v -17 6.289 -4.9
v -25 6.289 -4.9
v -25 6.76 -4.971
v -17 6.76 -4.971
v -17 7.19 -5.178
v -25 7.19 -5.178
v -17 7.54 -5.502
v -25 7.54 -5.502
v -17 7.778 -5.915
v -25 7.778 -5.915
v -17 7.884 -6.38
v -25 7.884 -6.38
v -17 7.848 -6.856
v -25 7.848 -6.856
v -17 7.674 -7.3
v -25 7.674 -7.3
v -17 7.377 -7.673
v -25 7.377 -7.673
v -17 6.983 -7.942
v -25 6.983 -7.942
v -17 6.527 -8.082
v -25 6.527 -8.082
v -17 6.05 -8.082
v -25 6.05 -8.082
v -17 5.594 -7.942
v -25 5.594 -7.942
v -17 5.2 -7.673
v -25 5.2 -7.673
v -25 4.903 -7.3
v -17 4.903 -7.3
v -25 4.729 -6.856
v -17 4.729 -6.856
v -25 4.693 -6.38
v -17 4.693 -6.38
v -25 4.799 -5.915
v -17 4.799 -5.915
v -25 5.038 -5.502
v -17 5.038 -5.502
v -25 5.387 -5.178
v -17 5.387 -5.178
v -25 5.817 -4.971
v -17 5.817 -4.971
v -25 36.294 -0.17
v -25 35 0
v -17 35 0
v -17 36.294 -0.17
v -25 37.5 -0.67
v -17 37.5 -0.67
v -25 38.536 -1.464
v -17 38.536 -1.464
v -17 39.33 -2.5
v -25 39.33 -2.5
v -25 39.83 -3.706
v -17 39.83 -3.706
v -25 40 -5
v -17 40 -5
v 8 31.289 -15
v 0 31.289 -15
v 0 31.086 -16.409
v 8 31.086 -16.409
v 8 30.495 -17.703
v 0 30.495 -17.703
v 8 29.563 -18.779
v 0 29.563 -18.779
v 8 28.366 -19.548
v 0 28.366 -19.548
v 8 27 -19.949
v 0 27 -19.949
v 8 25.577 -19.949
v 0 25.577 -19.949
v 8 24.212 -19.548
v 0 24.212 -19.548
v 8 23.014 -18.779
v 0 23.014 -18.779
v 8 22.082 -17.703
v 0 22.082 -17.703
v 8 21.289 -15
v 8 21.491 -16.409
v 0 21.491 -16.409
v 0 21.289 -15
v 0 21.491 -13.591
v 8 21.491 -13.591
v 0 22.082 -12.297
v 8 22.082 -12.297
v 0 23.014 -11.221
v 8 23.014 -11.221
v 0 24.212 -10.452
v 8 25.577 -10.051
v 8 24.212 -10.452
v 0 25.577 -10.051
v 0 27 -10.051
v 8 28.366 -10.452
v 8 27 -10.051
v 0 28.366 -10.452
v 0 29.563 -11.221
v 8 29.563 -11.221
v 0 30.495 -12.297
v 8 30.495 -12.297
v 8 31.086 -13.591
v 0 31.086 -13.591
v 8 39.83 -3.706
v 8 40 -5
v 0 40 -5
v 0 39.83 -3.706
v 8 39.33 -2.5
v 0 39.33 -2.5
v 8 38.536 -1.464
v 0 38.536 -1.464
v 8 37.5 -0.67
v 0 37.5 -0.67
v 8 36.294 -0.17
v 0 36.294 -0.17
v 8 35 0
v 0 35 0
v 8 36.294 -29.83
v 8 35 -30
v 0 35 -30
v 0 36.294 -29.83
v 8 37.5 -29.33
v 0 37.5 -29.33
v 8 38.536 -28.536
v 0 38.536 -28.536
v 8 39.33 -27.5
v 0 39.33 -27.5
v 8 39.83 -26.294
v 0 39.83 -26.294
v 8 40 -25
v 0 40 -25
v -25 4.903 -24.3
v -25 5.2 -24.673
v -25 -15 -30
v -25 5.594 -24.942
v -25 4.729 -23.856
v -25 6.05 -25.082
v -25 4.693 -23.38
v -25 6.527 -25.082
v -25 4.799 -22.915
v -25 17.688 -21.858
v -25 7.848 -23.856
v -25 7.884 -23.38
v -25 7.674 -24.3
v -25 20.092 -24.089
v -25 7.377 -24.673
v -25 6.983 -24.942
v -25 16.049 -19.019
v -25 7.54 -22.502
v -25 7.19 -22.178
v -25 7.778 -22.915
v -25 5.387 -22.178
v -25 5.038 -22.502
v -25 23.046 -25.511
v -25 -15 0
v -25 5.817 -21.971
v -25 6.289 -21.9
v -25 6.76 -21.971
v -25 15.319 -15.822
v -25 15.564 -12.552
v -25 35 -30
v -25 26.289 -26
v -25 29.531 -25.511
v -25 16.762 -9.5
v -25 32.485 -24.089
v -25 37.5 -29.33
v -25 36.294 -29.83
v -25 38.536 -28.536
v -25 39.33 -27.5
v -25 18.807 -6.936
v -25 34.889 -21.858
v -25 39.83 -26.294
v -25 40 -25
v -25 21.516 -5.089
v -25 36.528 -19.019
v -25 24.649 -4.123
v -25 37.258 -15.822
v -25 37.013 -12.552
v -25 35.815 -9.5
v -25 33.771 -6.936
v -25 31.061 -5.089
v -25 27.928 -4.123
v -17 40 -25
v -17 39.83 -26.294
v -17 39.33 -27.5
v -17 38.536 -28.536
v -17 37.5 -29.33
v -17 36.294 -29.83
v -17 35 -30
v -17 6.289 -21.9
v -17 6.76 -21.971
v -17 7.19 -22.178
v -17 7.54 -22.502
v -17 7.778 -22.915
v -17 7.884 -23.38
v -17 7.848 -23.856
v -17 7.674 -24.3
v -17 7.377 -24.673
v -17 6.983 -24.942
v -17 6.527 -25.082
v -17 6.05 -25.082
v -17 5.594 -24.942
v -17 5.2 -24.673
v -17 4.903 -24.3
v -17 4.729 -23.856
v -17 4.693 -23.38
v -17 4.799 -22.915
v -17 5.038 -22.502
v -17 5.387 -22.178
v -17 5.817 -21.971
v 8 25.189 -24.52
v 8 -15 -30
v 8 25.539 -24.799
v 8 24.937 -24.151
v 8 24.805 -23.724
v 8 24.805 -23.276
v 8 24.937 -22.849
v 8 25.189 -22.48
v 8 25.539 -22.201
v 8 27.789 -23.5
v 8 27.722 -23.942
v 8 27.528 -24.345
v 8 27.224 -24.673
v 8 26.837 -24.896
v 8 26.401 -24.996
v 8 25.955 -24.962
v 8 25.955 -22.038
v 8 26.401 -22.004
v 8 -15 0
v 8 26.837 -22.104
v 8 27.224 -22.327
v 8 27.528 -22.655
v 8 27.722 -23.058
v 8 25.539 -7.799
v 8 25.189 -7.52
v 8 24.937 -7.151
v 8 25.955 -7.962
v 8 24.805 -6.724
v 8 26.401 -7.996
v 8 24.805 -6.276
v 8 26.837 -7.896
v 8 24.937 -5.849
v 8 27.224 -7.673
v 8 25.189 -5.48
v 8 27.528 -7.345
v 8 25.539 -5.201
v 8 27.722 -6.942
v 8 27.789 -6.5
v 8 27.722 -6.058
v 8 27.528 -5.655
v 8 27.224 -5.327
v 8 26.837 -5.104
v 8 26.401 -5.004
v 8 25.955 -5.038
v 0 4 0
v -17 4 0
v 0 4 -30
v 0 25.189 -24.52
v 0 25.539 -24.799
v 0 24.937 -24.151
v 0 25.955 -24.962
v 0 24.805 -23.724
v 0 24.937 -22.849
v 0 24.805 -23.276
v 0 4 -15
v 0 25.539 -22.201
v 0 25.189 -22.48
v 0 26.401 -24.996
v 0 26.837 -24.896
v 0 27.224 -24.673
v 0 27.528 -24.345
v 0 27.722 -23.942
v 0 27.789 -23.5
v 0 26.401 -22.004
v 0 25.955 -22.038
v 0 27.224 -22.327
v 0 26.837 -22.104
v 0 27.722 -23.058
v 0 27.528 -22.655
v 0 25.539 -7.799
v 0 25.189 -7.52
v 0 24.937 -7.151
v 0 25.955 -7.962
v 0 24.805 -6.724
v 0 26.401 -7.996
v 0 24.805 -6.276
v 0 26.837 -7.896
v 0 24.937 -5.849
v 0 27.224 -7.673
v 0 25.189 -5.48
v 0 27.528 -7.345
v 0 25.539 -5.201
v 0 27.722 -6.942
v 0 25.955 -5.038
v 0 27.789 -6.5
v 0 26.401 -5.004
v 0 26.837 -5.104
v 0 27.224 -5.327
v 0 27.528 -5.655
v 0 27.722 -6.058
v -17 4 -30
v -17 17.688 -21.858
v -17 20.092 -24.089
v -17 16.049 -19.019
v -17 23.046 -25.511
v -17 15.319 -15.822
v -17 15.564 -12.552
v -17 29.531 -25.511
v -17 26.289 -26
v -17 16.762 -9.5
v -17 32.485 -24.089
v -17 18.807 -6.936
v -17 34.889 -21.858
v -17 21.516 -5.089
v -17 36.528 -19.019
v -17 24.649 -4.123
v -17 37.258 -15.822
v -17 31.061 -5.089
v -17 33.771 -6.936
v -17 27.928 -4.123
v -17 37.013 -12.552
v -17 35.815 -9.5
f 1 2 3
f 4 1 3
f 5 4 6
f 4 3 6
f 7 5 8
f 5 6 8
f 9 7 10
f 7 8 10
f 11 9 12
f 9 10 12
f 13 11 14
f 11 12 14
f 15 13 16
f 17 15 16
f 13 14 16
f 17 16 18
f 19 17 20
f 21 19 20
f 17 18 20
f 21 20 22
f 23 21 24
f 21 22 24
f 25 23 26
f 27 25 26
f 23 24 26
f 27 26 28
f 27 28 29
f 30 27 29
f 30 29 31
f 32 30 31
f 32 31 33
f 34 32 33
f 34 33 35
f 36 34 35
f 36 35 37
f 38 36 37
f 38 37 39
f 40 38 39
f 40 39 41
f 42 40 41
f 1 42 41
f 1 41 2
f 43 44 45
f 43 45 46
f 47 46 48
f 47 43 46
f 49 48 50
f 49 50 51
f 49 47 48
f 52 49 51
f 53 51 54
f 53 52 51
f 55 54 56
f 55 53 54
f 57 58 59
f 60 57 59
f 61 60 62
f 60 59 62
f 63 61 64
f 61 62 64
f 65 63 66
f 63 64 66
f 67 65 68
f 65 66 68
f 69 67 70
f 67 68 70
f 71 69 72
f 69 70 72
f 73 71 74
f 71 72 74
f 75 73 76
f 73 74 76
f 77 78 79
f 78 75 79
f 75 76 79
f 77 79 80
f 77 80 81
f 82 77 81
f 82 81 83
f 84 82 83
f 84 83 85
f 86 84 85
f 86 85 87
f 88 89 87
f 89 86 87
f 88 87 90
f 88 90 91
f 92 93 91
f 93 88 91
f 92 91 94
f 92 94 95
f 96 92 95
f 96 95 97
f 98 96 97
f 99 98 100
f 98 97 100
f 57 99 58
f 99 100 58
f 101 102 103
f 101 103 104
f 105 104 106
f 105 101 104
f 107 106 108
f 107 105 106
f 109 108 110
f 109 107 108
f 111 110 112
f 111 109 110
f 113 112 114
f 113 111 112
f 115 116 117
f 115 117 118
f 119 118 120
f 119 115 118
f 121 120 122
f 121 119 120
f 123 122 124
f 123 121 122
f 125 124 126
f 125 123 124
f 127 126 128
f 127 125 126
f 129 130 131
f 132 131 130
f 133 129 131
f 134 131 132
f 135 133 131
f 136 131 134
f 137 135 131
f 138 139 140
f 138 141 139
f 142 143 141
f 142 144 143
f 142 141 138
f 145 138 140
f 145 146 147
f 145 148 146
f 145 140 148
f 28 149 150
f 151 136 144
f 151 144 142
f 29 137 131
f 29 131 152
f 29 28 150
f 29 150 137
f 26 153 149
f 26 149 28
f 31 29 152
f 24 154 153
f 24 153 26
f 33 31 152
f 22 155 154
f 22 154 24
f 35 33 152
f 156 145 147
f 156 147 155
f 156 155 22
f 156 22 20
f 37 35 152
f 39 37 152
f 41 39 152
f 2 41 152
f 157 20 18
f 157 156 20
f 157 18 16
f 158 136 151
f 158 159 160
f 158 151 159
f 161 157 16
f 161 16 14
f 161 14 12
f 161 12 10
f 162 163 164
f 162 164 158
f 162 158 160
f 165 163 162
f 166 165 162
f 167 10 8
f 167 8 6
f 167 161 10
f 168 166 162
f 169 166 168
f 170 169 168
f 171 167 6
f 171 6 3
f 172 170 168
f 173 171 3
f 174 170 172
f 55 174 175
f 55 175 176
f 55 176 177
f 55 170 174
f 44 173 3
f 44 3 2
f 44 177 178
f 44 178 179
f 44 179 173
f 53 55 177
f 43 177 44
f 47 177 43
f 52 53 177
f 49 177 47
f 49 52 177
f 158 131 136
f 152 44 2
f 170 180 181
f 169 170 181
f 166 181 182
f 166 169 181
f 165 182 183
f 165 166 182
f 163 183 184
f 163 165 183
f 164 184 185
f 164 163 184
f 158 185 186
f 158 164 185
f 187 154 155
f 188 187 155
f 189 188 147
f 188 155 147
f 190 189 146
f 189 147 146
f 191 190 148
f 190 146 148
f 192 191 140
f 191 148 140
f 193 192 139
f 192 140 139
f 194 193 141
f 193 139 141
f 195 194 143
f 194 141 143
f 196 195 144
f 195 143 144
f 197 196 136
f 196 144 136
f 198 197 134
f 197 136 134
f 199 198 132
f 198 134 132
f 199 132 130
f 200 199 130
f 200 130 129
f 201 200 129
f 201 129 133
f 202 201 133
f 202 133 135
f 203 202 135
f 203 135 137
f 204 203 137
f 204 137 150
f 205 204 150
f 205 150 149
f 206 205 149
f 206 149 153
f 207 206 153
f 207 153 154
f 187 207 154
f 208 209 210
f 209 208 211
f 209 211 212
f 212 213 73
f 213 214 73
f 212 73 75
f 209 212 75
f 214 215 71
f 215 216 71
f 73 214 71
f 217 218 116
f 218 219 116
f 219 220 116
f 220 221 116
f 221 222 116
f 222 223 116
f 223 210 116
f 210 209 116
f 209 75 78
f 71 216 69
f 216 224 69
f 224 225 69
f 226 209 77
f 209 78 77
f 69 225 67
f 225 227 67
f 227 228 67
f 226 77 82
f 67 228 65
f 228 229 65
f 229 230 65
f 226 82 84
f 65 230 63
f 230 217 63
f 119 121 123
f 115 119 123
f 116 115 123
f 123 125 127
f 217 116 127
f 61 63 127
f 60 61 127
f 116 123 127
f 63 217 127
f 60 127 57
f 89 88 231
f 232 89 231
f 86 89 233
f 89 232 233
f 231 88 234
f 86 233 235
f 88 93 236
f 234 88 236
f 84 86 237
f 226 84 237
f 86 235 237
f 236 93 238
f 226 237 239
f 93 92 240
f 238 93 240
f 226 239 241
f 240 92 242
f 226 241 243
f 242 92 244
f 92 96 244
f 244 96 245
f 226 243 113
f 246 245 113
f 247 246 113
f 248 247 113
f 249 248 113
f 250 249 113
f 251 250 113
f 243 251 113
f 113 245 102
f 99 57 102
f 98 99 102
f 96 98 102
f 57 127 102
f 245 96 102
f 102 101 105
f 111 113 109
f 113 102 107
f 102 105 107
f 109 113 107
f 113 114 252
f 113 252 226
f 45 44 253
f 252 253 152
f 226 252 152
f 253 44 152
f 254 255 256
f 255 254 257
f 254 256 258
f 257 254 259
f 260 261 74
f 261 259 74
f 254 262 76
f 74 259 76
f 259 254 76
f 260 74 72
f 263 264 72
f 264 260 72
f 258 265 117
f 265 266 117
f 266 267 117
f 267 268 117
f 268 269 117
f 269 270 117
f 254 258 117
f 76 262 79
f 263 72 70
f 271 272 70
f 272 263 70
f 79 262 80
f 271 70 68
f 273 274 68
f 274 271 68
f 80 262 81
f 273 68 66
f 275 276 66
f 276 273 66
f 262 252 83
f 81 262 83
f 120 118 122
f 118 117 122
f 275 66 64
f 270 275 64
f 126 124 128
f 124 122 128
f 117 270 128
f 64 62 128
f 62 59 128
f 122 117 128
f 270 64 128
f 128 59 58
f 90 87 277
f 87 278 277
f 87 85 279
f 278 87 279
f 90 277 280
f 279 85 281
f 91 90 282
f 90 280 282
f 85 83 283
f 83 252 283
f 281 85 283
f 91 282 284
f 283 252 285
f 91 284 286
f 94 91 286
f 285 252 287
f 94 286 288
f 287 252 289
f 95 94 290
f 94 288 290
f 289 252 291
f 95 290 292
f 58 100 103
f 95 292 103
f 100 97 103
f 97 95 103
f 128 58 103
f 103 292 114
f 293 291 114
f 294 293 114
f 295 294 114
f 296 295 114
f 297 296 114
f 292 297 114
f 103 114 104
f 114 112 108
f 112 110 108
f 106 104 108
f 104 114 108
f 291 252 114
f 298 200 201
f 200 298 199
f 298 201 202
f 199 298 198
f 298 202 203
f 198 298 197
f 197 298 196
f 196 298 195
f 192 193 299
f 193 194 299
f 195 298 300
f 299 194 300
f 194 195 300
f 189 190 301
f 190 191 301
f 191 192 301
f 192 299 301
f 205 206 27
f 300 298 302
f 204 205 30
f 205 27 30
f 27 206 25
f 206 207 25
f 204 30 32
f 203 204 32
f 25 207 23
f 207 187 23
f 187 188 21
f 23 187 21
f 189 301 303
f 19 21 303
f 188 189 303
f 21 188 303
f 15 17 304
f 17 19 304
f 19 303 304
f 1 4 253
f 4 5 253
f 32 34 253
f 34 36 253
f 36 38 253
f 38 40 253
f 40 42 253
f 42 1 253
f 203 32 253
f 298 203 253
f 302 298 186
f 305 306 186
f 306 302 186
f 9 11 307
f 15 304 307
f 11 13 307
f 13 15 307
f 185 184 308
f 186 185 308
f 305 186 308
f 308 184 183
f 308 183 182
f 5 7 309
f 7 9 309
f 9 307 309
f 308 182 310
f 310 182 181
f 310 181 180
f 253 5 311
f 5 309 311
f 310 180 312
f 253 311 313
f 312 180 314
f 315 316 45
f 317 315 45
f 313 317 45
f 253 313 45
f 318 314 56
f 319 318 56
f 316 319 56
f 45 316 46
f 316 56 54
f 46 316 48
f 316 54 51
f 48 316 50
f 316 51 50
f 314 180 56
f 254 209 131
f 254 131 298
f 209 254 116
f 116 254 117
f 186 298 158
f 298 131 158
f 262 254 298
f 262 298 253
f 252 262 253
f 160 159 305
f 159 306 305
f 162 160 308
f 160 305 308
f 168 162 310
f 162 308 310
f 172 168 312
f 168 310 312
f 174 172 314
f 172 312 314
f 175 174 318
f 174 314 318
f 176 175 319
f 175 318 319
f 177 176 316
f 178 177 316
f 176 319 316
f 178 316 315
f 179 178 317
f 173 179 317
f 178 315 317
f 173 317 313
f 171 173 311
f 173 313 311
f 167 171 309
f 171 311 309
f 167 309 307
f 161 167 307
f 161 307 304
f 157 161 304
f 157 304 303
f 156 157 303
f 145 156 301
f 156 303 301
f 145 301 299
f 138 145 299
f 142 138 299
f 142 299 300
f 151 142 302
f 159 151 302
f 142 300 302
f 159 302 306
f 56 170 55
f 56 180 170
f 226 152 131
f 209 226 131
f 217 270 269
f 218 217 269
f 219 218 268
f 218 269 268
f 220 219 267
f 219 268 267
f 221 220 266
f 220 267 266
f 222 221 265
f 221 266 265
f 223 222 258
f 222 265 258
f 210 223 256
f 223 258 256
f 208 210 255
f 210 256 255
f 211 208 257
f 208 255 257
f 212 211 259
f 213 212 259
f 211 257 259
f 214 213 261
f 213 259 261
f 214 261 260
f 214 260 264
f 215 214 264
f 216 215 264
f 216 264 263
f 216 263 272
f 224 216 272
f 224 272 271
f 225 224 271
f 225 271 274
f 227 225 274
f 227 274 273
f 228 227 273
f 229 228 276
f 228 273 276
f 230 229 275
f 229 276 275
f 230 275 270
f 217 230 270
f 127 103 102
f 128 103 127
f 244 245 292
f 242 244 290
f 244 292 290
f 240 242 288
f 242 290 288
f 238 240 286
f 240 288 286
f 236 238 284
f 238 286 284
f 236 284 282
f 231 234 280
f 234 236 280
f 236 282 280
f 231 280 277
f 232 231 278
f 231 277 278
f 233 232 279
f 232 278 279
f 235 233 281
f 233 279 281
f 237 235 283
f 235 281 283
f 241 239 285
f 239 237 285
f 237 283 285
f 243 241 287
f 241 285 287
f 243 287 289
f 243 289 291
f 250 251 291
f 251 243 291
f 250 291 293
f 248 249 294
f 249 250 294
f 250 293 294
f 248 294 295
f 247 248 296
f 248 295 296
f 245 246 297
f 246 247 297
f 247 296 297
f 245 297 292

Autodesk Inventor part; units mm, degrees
ref_plane "YZ Plane" through (0, 0, 0) normal (1, 0, 0) x (0, 1, 0)
ref_plane "XZ Plane" through (0, 0, 0) normal (0, 1, 0) x (-1, 0, 0)
ref_plane "XY Plane" through (0, 0, 0) normal (0, 0, 1) x (1, 0, 0)
sketch "Sketch1" plane through (0, 0, 0) normal (1, 0, 0) x (0, 1, 0)
  line L0 (0, 0) -> (40, 0)
  line L1 (40, 0) -> (40, -30)
  line L2 (40, -30) -> (0, -30)
  line L3 (0, -30) -> (0, 0)
  line L4 (0, -15) -> (26.2886, -15)
  circle A0 centre (26.2886, -15) radius 8.5
  circle A1 centre (26.2886, -23.5) radius 1.5
  circle A2 centre (26.2886, -6.5) radius 1.5
  circle A3 centre (26.2886, -15) radius 5
  dimension "d0" = 40
  dimension "d1" = 30
  dimension "d2" = 17
  dimension "d3" = 3
  dimension "d4" = 3
  dimension "d5" = 10
extrude "Extrusion1" add sketch "Sketch1" along normal blind 8 contours A0 A2 A1 | L0 L1 L2 L3
sketch "Sketch2" plane through (0, 0, 0) normal (-1, 0, 0) x (0, 0, 1)
  line L0 (0, 40) -> (0, 0) projected
  line L1 (-30, 0) -> (-30, 40) projected
  line L2 (0, 0) -> (-30, 0)
  line L3 (-30, 0) -> (-30, 4)
  line L4 (-30, 4) -> (0, 4)
  line L5 (0, 4) -> (0, 0)
  dimension "d8" = 4
extrude "Extrusion2" add sketch "Sketch2" along normal blind 17
sketch "Sketch3" plane through (-17, 0, 0) normal (-1, 0, 0) x (0, 0, 1)
  line L0 (0, 40) -> (0, 0) projected
  line L1 (-30, 40) -> (0, 40) projected
  line L2 (0, 0) -> (-30, 0)
  line L3 (-30, 0) -> (-30, 40)
  line L4 (-30, 40) -> (0, 40)
  line L5 (0, 40) -> (0, 0)
extrude "Extrusion3" add sketch "Sketch3" along normal blind 8
sketch "Sketch4" plane through (-17, 0, 0) normal (1, 0, 0) x (0, 0, -1)
  circle A0 centre (15, 26.2886) radius 5 projected
  circle A1 centre (15, 26.2886) radius 11
  point P0 (0, 0)
  dimension "d13" = 22
extrude "Extrusion4" cut sketch "Sketch4" against normal through all contours A0 | A1
fillet "Fillet1" radius 5 4 edges at (4, 40, 0) (-21, 40, 0) (-21, 40, -30) (4, 40, -30)
sketch "Sketch5" plane through (-25, 0, 0) normal (-1, 0, 0) x (0, 0, 1)
  circle A0 centre (-15, 26.2886) radius 11 projected
  line L0 (-15, 26.2886) -> (-15, 6.2886)
  line L1 (-15, 6.2886) -> (-6.5, 6.2886)
  line L2 (-30, 35) -> (-30, 4) projected
  line L3 (-6.5, 6.2886) -> (-23.5, 6.2886)
  circle A1 centre (-6.5, 6.2886) radius 1.6
  circle A2 centre (-23.5, 6.2886) radius 1.6
  point P0 (0, 0)
  dimension "d17" = 20
  dimension "d18" = 8.5
  dimension "d19" = 17
  dimension "d20" = 3.2
  dimension "d21" = 3.2
extrude "Extrusion5" cut sketch "Sketch5" against normal blind 10 contours A1 | A2
sketch "Sketch6" plane through (-25, 0, 0) normal (-1, 0, 0) x (0, 0, 1)
  line L0 (-30, 0) -> (-30, 35) projected
  line L1 (-30, 0) -> (0, 0)
  line L2 (0, 0) -> (0, -15)
  line L3 (0, -15) -> (-30, -15)
  line L4 (-30, -15) -> (-30, 0)
  dimension "d24" = 15
extrude "Extrusion6" add sketch "Sketch6" against normal blind 33
sketch "Sketch7" plane through (8, 0, 0) normal (1, 0, 0) x (0, 0, -1)
  arc A0 (30, 35) -> (25, 40) centre (25, 35) ccw projected
  line L0 (25, 40) -> (5, 40) projected
  arc A1 (5, 40) -> (0, 35) centre (5, 35) ccw projected
  line L1 (0, 35) -> (0, -15) projected
  line L2 (0, -15) -> (30, -15) projected
  line L3 (30, -15) -> (30, 35) projected
  circle A2 centre (23.5, 26.2886) radius 1.5 projected
  circle A3 centre (6.5, 26.2886) radius 1.5 projected
  circle A4 centre (15, 26.2886) radius 5 projected
  point P0 (0, 0)
sketch "Sketch8" plane through (-25, 0, 0) normal (-1, 0, 0) x (0, 0, 1)
  circle A0 centre (-23.5, 6.2886) radius 1.6 projected
  circle A1 centre (-6.5, 6.2886) radius 1.6 projected
  circle A2 centre (-15, 26.2886) radius 11 projected
  arc A3 (-25, 40) -> (-30, 35) centre (-25, 35) ccw projected
  line L0 (-30, 35) -> (-30, -15) projected
  line L1 (-30, -15) -> (0, -15) projected
  line L2 (0, -15) -> (0, 35) projected
  arc A4 (0, 35) -> (-5, 40) centre (-5, 35) ccw projected
  line L3 (-5, 40) -> (-25, 40) projected
  point P0 (0, 0)
properties part number "base" material "Polycarbonate, Clear"
